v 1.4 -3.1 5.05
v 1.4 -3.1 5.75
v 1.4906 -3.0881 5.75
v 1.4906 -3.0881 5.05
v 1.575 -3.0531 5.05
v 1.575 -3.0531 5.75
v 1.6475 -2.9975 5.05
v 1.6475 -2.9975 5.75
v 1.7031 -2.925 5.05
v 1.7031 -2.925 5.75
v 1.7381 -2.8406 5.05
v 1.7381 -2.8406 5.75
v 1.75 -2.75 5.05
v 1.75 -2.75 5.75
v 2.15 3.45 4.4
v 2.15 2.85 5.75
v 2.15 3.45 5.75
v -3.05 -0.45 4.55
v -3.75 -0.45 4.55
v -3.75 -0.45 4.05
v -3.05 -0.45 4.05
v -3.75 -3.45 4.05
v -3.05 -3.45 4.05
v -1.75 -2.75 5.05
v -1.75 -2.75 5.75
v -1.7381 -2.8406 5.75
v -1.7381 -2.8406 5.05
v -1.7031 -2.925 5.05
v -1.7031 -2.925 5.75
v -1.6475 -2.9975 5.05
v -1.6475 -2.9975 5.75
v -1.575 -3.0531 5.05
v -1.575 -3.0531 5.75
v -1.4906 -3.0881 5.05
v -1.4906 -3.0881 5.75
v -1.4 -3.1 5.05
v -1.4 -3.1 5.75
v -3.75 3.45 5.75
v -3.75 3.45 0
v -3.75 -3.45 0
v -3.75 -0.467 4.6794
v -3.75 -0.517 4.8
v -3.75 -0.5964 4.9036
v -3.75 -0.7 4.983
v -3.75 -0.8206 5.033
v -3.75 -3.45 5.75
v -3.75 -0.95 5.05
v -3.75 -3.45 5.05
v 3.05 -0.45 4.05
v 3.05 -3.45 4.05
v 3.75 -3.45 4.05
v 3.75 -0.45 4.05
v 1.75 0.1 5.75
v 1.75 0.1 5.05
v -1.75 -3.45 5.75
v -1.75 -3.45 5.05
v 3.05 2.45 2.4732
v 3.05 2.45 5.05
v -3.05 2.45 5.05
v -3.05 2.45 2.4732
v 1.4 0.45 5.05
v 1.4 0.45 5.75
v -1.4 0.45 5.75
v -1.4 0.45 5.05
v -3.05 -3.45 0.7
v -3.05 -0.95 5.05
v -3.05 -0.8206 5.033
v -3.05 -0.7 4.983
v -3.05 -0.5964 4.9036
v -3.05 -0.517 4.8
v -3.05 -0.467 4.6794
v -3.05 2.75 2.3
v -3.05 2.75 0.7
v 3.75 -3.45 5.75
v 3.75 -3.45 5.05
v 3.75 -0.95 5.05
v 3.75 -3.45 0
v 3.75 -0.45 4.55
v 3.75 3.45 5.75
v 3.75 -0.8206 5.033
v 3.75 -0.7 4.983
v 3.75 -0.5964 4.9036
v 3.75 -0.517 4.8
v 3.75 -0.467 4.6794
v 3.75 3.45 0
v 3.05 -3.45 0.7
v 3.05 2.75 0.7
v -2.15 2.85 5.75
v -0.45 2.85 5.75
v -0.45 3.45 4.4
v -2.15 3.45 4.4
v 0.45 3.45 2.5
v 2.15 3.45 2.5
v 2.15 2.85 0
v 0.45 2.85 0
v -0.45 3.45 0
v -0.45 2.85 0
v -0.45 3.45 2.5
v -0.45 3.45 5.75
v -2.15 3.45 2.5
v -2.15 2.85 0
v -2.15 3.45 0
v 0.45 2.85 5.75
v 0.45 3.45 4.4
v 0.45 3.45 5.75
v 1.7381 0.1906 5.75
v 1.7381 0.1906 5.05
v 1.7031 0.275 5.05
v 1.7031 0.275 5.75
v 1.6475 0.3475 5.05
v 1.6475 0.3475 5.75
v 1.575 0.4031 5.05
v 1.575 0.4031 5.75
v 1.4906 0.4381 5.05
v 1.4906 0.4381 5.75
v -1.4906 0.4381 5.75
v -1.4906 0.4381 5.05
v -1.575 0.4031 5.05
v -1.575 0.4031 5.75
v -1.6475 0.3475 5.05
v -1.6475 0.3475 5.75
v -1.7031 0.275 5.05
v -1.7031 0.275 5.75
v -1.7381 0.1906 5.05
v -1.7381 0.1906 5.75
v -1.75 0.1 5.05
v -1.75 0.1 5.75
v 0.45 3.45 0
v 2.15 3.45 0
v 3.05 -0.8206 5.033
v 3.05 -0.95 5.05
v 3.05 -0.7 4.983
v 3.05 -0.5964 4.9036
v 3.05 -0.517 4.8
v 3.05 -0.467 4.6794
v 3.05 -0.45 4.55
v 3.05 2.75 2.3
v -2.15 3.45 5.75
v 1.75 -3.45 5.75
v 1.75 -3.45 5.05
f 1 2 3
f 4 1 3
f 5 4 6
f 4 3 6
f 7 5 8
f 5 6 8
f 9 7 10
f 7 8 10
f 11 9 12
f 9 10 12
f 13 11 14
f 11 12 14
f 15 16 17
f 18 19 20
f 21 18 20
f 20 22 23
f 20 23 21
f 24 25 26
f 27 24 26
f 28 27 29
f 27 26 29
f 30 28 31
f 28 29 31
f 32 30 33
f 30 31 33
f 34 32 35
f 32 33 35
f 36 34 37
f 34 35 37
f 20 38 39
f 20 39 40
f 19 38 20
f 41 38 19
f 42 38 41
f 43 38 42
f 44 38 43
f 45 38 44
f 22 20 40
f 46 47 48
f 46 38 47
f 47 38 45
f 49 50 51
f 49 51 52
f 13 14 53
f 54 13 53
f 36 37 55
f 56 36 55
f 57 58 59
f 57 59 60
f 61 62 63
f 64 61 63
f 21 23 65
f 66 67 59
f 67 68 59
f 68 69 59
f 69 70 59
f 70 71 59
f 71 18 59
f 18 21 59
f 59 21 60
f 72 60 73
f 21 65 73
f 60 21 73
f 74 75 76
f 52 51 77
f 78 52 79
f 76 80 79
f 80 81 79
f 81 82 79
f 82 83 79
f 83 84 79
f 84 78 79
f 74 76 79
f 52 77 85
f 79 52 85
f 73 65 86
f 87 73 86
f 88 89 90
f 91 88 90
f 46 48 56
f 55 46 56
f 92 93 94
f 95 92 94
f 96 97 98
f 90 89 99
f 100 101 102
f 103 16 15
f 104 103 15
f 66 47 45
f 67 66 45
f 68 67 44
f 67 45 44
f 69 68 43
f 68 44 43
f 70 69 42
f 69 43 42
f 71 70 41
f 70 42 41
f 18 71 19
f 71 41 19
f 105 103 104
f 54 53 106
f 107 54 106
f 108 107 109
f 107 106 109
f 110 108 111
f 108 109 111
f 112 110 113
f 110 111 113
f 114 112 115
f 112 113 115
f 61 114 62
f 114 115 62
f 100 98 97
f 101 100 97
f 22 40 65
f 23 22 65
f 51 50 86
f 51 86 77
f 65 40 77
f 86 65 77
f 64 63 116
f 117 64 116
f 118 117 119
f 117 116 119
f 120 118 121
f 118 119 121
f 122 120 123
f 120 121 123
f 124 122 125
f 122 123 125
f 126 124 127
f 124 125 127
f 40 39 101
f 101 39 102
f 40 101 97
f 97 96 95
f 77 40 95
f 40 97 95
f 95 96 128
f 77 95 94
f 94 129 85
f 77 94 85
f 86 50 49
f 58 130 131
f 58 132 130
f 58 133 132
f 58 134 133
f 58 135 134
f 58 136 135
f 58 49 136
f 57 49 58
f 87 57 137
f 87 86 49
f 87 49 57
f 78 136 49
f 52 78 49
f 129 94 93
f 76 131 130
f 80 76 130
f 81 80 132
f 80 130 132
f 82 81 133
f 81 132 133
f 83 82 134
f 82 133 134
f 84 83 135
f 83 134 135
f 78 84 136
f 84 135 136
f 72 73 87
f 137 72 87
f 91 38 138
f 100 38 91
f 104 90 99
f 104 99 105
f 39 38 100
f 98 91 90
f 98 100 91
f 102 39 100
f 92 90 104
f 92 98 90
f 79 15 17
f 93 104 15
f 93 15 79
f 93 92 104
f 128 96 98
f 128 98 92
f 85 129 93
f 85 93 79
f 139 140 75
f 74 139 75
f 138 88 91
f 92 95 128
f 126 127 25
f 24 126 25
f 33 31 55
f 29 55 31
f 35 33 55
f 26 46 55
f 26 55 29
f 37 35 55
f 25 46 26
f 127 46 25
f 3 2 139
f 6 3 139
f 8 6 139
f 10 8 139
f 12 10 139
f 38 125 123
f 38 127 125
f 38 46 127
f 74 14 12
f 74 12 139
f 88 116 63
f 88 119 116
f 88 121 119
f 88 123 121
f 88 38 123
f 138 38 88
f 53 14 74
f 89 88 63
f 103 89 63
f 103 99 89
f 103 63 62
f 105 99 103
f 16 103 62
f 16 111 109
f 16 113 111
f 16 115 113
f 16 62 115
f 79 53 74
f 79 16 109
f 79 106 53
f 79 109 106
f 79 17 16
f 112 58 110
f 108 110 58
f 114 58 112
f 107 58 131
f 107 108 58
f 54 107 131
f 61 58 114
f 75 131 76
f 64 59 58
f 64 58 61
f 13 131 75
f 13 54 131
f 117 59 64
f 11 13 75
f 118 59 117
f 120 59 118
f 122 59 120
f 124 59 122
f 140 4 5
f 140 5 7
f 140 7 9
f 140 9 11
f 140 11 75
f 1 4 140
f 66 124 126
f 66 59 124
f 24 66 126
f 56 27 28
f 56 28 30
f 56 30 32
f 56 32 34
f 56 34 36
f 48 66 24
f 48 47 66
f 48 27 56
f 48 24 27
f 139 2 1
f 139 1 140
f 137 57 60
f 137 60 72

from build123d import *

# Parameters (mm, degrees)
SKETCH_W        = 7.5
SKETCH_H        = 6.9
PAD_DEPTH       = 5.75
THICKNESS_T     = -0.7
POCKET_DEPTH    = 0.7
POCKET001_DEPTH = 7.501
PAD004_DEPTH    = 6.1
SKETCH005_W     = 1.7
SKETCH005_H     = 0.6
POCKET002_DEPTH = 7.001
PAD005_DEPTH    = 5.9


with BuildPart() as part:
    # Sketch → Pad (new body)
    with BuildSketch(Plane.XY):
        Rectangle(SKETCH_W, SKETCH_H)
    extrude(amount=PAD_DEPTH)

    # Thickness
    thickness_openings = [part.faces().sort_by_distance(p)[0] for p in [
        (0, -3.45, 2.875),
    ]]
    offset(amount=THICKNESS_T, openings=thickness_openings, kind=Kind.INTERSECTION)

    # Sketch001 (on Face5 of Thickness) → Pocket (cut)
    with BuildSketch(Plane.XY.offset(5.75)):
        with BuildLine():
            Line((1.75, -2.75), (1.75, 0.1))
            ThreePointArc((1.75, 0.1), (1.647487, 0.347487), (1.4, 0.45))
            Line((1.4, 0.45), (-1.4, 0.45))
            ThreePointArc((-1.4, 0.45), (-1.647487, 0.347487), (-1.75, 0.1))
            Line((-1.75, 0.1), (-1.75, -2.75))
            ThreePointArc((-1.75, -2.75), (-1.647487, -2.997487), (-1.4, -3.1))
            Line((-1.4, -3.1), (-1.75, -3.45))
            Line((-1.75, -3.45), (1.75, -3.45))
            Line((1.4, -3.1), (1.75, -3.45))
            ThreePointArc((1.4, -3.1), (1.647487, -2.997487), (1.75, -2.75))
        make_face()
    extrude(amount=-POCKET_DEPTH, mode=Mode.SUBTRACT)

    # Sketch002 (on Face2 of Pocket) → Pocket001 (cut, through all)
    with BuildSketch(Plane(origin=(-3.75, 0, 0), x_dir=(0, -1, 0), z_dir=(-1, 0, 0))):
        with BuildLine():
            Line((0.95, 5.05), (3.45, 5.05))
            Line((3.45, 5.05), (3.45, 4.05))
            Line((3.45, 4.05), (0.45, 4.05))
            Line((0.45, 4.55), (0.45, 4.05))
            ThreePointArc((0.95, 5.05), (0.596447, 4.903553), (0.45, 4.55))
        make_face()
    extrude(amount=-POCKET001_DEPTH, mode=Mode.SUBTRACT)

    # Sketch008 → Pad004 (join)
    with BuildSketch(Plane(origin=(3.05, 0, 0), x_dir=(0, -1, 0), z_dir=(-1, 0, 0))):
        Polygon((-2.75, 5.05), (-2.45, 5.05), (-2.45, 2.473205), (-2.75, 2.3), align=None)
    extrude(amount=PAD004_DEPTH)

    # Sketch005 → Pocket002 (cut, through all)
    with BuildSketch(Plane.XY.offset(7)):
        with Locations((-1.3, 3.15)):
            Rectangle(SKETCH005_W, SKETCH005_H)
        with Locations((1.3, 3.15)):
            Rectangle(SKETCH005_W, SKETCH005_H)
    extrude(amount=-POCKET002_DEPTH, mode=Mode.SUBTRACT)

    # Sketch009 (on ShapeBinder) → Pad005 (join)
    with BuildSketch(Plane(origin=(2.15, 0, 0), x_dir=(0, -1, 0), z_dir=(-1, 0, 0))):
        Polygon((-2.85, 5.75), (-3.45, 4.4), (-3.45, 2.5), (-2.85, 0), align=None)
    extrude(amount=PAD005_DEPTH)


solid = part.part
